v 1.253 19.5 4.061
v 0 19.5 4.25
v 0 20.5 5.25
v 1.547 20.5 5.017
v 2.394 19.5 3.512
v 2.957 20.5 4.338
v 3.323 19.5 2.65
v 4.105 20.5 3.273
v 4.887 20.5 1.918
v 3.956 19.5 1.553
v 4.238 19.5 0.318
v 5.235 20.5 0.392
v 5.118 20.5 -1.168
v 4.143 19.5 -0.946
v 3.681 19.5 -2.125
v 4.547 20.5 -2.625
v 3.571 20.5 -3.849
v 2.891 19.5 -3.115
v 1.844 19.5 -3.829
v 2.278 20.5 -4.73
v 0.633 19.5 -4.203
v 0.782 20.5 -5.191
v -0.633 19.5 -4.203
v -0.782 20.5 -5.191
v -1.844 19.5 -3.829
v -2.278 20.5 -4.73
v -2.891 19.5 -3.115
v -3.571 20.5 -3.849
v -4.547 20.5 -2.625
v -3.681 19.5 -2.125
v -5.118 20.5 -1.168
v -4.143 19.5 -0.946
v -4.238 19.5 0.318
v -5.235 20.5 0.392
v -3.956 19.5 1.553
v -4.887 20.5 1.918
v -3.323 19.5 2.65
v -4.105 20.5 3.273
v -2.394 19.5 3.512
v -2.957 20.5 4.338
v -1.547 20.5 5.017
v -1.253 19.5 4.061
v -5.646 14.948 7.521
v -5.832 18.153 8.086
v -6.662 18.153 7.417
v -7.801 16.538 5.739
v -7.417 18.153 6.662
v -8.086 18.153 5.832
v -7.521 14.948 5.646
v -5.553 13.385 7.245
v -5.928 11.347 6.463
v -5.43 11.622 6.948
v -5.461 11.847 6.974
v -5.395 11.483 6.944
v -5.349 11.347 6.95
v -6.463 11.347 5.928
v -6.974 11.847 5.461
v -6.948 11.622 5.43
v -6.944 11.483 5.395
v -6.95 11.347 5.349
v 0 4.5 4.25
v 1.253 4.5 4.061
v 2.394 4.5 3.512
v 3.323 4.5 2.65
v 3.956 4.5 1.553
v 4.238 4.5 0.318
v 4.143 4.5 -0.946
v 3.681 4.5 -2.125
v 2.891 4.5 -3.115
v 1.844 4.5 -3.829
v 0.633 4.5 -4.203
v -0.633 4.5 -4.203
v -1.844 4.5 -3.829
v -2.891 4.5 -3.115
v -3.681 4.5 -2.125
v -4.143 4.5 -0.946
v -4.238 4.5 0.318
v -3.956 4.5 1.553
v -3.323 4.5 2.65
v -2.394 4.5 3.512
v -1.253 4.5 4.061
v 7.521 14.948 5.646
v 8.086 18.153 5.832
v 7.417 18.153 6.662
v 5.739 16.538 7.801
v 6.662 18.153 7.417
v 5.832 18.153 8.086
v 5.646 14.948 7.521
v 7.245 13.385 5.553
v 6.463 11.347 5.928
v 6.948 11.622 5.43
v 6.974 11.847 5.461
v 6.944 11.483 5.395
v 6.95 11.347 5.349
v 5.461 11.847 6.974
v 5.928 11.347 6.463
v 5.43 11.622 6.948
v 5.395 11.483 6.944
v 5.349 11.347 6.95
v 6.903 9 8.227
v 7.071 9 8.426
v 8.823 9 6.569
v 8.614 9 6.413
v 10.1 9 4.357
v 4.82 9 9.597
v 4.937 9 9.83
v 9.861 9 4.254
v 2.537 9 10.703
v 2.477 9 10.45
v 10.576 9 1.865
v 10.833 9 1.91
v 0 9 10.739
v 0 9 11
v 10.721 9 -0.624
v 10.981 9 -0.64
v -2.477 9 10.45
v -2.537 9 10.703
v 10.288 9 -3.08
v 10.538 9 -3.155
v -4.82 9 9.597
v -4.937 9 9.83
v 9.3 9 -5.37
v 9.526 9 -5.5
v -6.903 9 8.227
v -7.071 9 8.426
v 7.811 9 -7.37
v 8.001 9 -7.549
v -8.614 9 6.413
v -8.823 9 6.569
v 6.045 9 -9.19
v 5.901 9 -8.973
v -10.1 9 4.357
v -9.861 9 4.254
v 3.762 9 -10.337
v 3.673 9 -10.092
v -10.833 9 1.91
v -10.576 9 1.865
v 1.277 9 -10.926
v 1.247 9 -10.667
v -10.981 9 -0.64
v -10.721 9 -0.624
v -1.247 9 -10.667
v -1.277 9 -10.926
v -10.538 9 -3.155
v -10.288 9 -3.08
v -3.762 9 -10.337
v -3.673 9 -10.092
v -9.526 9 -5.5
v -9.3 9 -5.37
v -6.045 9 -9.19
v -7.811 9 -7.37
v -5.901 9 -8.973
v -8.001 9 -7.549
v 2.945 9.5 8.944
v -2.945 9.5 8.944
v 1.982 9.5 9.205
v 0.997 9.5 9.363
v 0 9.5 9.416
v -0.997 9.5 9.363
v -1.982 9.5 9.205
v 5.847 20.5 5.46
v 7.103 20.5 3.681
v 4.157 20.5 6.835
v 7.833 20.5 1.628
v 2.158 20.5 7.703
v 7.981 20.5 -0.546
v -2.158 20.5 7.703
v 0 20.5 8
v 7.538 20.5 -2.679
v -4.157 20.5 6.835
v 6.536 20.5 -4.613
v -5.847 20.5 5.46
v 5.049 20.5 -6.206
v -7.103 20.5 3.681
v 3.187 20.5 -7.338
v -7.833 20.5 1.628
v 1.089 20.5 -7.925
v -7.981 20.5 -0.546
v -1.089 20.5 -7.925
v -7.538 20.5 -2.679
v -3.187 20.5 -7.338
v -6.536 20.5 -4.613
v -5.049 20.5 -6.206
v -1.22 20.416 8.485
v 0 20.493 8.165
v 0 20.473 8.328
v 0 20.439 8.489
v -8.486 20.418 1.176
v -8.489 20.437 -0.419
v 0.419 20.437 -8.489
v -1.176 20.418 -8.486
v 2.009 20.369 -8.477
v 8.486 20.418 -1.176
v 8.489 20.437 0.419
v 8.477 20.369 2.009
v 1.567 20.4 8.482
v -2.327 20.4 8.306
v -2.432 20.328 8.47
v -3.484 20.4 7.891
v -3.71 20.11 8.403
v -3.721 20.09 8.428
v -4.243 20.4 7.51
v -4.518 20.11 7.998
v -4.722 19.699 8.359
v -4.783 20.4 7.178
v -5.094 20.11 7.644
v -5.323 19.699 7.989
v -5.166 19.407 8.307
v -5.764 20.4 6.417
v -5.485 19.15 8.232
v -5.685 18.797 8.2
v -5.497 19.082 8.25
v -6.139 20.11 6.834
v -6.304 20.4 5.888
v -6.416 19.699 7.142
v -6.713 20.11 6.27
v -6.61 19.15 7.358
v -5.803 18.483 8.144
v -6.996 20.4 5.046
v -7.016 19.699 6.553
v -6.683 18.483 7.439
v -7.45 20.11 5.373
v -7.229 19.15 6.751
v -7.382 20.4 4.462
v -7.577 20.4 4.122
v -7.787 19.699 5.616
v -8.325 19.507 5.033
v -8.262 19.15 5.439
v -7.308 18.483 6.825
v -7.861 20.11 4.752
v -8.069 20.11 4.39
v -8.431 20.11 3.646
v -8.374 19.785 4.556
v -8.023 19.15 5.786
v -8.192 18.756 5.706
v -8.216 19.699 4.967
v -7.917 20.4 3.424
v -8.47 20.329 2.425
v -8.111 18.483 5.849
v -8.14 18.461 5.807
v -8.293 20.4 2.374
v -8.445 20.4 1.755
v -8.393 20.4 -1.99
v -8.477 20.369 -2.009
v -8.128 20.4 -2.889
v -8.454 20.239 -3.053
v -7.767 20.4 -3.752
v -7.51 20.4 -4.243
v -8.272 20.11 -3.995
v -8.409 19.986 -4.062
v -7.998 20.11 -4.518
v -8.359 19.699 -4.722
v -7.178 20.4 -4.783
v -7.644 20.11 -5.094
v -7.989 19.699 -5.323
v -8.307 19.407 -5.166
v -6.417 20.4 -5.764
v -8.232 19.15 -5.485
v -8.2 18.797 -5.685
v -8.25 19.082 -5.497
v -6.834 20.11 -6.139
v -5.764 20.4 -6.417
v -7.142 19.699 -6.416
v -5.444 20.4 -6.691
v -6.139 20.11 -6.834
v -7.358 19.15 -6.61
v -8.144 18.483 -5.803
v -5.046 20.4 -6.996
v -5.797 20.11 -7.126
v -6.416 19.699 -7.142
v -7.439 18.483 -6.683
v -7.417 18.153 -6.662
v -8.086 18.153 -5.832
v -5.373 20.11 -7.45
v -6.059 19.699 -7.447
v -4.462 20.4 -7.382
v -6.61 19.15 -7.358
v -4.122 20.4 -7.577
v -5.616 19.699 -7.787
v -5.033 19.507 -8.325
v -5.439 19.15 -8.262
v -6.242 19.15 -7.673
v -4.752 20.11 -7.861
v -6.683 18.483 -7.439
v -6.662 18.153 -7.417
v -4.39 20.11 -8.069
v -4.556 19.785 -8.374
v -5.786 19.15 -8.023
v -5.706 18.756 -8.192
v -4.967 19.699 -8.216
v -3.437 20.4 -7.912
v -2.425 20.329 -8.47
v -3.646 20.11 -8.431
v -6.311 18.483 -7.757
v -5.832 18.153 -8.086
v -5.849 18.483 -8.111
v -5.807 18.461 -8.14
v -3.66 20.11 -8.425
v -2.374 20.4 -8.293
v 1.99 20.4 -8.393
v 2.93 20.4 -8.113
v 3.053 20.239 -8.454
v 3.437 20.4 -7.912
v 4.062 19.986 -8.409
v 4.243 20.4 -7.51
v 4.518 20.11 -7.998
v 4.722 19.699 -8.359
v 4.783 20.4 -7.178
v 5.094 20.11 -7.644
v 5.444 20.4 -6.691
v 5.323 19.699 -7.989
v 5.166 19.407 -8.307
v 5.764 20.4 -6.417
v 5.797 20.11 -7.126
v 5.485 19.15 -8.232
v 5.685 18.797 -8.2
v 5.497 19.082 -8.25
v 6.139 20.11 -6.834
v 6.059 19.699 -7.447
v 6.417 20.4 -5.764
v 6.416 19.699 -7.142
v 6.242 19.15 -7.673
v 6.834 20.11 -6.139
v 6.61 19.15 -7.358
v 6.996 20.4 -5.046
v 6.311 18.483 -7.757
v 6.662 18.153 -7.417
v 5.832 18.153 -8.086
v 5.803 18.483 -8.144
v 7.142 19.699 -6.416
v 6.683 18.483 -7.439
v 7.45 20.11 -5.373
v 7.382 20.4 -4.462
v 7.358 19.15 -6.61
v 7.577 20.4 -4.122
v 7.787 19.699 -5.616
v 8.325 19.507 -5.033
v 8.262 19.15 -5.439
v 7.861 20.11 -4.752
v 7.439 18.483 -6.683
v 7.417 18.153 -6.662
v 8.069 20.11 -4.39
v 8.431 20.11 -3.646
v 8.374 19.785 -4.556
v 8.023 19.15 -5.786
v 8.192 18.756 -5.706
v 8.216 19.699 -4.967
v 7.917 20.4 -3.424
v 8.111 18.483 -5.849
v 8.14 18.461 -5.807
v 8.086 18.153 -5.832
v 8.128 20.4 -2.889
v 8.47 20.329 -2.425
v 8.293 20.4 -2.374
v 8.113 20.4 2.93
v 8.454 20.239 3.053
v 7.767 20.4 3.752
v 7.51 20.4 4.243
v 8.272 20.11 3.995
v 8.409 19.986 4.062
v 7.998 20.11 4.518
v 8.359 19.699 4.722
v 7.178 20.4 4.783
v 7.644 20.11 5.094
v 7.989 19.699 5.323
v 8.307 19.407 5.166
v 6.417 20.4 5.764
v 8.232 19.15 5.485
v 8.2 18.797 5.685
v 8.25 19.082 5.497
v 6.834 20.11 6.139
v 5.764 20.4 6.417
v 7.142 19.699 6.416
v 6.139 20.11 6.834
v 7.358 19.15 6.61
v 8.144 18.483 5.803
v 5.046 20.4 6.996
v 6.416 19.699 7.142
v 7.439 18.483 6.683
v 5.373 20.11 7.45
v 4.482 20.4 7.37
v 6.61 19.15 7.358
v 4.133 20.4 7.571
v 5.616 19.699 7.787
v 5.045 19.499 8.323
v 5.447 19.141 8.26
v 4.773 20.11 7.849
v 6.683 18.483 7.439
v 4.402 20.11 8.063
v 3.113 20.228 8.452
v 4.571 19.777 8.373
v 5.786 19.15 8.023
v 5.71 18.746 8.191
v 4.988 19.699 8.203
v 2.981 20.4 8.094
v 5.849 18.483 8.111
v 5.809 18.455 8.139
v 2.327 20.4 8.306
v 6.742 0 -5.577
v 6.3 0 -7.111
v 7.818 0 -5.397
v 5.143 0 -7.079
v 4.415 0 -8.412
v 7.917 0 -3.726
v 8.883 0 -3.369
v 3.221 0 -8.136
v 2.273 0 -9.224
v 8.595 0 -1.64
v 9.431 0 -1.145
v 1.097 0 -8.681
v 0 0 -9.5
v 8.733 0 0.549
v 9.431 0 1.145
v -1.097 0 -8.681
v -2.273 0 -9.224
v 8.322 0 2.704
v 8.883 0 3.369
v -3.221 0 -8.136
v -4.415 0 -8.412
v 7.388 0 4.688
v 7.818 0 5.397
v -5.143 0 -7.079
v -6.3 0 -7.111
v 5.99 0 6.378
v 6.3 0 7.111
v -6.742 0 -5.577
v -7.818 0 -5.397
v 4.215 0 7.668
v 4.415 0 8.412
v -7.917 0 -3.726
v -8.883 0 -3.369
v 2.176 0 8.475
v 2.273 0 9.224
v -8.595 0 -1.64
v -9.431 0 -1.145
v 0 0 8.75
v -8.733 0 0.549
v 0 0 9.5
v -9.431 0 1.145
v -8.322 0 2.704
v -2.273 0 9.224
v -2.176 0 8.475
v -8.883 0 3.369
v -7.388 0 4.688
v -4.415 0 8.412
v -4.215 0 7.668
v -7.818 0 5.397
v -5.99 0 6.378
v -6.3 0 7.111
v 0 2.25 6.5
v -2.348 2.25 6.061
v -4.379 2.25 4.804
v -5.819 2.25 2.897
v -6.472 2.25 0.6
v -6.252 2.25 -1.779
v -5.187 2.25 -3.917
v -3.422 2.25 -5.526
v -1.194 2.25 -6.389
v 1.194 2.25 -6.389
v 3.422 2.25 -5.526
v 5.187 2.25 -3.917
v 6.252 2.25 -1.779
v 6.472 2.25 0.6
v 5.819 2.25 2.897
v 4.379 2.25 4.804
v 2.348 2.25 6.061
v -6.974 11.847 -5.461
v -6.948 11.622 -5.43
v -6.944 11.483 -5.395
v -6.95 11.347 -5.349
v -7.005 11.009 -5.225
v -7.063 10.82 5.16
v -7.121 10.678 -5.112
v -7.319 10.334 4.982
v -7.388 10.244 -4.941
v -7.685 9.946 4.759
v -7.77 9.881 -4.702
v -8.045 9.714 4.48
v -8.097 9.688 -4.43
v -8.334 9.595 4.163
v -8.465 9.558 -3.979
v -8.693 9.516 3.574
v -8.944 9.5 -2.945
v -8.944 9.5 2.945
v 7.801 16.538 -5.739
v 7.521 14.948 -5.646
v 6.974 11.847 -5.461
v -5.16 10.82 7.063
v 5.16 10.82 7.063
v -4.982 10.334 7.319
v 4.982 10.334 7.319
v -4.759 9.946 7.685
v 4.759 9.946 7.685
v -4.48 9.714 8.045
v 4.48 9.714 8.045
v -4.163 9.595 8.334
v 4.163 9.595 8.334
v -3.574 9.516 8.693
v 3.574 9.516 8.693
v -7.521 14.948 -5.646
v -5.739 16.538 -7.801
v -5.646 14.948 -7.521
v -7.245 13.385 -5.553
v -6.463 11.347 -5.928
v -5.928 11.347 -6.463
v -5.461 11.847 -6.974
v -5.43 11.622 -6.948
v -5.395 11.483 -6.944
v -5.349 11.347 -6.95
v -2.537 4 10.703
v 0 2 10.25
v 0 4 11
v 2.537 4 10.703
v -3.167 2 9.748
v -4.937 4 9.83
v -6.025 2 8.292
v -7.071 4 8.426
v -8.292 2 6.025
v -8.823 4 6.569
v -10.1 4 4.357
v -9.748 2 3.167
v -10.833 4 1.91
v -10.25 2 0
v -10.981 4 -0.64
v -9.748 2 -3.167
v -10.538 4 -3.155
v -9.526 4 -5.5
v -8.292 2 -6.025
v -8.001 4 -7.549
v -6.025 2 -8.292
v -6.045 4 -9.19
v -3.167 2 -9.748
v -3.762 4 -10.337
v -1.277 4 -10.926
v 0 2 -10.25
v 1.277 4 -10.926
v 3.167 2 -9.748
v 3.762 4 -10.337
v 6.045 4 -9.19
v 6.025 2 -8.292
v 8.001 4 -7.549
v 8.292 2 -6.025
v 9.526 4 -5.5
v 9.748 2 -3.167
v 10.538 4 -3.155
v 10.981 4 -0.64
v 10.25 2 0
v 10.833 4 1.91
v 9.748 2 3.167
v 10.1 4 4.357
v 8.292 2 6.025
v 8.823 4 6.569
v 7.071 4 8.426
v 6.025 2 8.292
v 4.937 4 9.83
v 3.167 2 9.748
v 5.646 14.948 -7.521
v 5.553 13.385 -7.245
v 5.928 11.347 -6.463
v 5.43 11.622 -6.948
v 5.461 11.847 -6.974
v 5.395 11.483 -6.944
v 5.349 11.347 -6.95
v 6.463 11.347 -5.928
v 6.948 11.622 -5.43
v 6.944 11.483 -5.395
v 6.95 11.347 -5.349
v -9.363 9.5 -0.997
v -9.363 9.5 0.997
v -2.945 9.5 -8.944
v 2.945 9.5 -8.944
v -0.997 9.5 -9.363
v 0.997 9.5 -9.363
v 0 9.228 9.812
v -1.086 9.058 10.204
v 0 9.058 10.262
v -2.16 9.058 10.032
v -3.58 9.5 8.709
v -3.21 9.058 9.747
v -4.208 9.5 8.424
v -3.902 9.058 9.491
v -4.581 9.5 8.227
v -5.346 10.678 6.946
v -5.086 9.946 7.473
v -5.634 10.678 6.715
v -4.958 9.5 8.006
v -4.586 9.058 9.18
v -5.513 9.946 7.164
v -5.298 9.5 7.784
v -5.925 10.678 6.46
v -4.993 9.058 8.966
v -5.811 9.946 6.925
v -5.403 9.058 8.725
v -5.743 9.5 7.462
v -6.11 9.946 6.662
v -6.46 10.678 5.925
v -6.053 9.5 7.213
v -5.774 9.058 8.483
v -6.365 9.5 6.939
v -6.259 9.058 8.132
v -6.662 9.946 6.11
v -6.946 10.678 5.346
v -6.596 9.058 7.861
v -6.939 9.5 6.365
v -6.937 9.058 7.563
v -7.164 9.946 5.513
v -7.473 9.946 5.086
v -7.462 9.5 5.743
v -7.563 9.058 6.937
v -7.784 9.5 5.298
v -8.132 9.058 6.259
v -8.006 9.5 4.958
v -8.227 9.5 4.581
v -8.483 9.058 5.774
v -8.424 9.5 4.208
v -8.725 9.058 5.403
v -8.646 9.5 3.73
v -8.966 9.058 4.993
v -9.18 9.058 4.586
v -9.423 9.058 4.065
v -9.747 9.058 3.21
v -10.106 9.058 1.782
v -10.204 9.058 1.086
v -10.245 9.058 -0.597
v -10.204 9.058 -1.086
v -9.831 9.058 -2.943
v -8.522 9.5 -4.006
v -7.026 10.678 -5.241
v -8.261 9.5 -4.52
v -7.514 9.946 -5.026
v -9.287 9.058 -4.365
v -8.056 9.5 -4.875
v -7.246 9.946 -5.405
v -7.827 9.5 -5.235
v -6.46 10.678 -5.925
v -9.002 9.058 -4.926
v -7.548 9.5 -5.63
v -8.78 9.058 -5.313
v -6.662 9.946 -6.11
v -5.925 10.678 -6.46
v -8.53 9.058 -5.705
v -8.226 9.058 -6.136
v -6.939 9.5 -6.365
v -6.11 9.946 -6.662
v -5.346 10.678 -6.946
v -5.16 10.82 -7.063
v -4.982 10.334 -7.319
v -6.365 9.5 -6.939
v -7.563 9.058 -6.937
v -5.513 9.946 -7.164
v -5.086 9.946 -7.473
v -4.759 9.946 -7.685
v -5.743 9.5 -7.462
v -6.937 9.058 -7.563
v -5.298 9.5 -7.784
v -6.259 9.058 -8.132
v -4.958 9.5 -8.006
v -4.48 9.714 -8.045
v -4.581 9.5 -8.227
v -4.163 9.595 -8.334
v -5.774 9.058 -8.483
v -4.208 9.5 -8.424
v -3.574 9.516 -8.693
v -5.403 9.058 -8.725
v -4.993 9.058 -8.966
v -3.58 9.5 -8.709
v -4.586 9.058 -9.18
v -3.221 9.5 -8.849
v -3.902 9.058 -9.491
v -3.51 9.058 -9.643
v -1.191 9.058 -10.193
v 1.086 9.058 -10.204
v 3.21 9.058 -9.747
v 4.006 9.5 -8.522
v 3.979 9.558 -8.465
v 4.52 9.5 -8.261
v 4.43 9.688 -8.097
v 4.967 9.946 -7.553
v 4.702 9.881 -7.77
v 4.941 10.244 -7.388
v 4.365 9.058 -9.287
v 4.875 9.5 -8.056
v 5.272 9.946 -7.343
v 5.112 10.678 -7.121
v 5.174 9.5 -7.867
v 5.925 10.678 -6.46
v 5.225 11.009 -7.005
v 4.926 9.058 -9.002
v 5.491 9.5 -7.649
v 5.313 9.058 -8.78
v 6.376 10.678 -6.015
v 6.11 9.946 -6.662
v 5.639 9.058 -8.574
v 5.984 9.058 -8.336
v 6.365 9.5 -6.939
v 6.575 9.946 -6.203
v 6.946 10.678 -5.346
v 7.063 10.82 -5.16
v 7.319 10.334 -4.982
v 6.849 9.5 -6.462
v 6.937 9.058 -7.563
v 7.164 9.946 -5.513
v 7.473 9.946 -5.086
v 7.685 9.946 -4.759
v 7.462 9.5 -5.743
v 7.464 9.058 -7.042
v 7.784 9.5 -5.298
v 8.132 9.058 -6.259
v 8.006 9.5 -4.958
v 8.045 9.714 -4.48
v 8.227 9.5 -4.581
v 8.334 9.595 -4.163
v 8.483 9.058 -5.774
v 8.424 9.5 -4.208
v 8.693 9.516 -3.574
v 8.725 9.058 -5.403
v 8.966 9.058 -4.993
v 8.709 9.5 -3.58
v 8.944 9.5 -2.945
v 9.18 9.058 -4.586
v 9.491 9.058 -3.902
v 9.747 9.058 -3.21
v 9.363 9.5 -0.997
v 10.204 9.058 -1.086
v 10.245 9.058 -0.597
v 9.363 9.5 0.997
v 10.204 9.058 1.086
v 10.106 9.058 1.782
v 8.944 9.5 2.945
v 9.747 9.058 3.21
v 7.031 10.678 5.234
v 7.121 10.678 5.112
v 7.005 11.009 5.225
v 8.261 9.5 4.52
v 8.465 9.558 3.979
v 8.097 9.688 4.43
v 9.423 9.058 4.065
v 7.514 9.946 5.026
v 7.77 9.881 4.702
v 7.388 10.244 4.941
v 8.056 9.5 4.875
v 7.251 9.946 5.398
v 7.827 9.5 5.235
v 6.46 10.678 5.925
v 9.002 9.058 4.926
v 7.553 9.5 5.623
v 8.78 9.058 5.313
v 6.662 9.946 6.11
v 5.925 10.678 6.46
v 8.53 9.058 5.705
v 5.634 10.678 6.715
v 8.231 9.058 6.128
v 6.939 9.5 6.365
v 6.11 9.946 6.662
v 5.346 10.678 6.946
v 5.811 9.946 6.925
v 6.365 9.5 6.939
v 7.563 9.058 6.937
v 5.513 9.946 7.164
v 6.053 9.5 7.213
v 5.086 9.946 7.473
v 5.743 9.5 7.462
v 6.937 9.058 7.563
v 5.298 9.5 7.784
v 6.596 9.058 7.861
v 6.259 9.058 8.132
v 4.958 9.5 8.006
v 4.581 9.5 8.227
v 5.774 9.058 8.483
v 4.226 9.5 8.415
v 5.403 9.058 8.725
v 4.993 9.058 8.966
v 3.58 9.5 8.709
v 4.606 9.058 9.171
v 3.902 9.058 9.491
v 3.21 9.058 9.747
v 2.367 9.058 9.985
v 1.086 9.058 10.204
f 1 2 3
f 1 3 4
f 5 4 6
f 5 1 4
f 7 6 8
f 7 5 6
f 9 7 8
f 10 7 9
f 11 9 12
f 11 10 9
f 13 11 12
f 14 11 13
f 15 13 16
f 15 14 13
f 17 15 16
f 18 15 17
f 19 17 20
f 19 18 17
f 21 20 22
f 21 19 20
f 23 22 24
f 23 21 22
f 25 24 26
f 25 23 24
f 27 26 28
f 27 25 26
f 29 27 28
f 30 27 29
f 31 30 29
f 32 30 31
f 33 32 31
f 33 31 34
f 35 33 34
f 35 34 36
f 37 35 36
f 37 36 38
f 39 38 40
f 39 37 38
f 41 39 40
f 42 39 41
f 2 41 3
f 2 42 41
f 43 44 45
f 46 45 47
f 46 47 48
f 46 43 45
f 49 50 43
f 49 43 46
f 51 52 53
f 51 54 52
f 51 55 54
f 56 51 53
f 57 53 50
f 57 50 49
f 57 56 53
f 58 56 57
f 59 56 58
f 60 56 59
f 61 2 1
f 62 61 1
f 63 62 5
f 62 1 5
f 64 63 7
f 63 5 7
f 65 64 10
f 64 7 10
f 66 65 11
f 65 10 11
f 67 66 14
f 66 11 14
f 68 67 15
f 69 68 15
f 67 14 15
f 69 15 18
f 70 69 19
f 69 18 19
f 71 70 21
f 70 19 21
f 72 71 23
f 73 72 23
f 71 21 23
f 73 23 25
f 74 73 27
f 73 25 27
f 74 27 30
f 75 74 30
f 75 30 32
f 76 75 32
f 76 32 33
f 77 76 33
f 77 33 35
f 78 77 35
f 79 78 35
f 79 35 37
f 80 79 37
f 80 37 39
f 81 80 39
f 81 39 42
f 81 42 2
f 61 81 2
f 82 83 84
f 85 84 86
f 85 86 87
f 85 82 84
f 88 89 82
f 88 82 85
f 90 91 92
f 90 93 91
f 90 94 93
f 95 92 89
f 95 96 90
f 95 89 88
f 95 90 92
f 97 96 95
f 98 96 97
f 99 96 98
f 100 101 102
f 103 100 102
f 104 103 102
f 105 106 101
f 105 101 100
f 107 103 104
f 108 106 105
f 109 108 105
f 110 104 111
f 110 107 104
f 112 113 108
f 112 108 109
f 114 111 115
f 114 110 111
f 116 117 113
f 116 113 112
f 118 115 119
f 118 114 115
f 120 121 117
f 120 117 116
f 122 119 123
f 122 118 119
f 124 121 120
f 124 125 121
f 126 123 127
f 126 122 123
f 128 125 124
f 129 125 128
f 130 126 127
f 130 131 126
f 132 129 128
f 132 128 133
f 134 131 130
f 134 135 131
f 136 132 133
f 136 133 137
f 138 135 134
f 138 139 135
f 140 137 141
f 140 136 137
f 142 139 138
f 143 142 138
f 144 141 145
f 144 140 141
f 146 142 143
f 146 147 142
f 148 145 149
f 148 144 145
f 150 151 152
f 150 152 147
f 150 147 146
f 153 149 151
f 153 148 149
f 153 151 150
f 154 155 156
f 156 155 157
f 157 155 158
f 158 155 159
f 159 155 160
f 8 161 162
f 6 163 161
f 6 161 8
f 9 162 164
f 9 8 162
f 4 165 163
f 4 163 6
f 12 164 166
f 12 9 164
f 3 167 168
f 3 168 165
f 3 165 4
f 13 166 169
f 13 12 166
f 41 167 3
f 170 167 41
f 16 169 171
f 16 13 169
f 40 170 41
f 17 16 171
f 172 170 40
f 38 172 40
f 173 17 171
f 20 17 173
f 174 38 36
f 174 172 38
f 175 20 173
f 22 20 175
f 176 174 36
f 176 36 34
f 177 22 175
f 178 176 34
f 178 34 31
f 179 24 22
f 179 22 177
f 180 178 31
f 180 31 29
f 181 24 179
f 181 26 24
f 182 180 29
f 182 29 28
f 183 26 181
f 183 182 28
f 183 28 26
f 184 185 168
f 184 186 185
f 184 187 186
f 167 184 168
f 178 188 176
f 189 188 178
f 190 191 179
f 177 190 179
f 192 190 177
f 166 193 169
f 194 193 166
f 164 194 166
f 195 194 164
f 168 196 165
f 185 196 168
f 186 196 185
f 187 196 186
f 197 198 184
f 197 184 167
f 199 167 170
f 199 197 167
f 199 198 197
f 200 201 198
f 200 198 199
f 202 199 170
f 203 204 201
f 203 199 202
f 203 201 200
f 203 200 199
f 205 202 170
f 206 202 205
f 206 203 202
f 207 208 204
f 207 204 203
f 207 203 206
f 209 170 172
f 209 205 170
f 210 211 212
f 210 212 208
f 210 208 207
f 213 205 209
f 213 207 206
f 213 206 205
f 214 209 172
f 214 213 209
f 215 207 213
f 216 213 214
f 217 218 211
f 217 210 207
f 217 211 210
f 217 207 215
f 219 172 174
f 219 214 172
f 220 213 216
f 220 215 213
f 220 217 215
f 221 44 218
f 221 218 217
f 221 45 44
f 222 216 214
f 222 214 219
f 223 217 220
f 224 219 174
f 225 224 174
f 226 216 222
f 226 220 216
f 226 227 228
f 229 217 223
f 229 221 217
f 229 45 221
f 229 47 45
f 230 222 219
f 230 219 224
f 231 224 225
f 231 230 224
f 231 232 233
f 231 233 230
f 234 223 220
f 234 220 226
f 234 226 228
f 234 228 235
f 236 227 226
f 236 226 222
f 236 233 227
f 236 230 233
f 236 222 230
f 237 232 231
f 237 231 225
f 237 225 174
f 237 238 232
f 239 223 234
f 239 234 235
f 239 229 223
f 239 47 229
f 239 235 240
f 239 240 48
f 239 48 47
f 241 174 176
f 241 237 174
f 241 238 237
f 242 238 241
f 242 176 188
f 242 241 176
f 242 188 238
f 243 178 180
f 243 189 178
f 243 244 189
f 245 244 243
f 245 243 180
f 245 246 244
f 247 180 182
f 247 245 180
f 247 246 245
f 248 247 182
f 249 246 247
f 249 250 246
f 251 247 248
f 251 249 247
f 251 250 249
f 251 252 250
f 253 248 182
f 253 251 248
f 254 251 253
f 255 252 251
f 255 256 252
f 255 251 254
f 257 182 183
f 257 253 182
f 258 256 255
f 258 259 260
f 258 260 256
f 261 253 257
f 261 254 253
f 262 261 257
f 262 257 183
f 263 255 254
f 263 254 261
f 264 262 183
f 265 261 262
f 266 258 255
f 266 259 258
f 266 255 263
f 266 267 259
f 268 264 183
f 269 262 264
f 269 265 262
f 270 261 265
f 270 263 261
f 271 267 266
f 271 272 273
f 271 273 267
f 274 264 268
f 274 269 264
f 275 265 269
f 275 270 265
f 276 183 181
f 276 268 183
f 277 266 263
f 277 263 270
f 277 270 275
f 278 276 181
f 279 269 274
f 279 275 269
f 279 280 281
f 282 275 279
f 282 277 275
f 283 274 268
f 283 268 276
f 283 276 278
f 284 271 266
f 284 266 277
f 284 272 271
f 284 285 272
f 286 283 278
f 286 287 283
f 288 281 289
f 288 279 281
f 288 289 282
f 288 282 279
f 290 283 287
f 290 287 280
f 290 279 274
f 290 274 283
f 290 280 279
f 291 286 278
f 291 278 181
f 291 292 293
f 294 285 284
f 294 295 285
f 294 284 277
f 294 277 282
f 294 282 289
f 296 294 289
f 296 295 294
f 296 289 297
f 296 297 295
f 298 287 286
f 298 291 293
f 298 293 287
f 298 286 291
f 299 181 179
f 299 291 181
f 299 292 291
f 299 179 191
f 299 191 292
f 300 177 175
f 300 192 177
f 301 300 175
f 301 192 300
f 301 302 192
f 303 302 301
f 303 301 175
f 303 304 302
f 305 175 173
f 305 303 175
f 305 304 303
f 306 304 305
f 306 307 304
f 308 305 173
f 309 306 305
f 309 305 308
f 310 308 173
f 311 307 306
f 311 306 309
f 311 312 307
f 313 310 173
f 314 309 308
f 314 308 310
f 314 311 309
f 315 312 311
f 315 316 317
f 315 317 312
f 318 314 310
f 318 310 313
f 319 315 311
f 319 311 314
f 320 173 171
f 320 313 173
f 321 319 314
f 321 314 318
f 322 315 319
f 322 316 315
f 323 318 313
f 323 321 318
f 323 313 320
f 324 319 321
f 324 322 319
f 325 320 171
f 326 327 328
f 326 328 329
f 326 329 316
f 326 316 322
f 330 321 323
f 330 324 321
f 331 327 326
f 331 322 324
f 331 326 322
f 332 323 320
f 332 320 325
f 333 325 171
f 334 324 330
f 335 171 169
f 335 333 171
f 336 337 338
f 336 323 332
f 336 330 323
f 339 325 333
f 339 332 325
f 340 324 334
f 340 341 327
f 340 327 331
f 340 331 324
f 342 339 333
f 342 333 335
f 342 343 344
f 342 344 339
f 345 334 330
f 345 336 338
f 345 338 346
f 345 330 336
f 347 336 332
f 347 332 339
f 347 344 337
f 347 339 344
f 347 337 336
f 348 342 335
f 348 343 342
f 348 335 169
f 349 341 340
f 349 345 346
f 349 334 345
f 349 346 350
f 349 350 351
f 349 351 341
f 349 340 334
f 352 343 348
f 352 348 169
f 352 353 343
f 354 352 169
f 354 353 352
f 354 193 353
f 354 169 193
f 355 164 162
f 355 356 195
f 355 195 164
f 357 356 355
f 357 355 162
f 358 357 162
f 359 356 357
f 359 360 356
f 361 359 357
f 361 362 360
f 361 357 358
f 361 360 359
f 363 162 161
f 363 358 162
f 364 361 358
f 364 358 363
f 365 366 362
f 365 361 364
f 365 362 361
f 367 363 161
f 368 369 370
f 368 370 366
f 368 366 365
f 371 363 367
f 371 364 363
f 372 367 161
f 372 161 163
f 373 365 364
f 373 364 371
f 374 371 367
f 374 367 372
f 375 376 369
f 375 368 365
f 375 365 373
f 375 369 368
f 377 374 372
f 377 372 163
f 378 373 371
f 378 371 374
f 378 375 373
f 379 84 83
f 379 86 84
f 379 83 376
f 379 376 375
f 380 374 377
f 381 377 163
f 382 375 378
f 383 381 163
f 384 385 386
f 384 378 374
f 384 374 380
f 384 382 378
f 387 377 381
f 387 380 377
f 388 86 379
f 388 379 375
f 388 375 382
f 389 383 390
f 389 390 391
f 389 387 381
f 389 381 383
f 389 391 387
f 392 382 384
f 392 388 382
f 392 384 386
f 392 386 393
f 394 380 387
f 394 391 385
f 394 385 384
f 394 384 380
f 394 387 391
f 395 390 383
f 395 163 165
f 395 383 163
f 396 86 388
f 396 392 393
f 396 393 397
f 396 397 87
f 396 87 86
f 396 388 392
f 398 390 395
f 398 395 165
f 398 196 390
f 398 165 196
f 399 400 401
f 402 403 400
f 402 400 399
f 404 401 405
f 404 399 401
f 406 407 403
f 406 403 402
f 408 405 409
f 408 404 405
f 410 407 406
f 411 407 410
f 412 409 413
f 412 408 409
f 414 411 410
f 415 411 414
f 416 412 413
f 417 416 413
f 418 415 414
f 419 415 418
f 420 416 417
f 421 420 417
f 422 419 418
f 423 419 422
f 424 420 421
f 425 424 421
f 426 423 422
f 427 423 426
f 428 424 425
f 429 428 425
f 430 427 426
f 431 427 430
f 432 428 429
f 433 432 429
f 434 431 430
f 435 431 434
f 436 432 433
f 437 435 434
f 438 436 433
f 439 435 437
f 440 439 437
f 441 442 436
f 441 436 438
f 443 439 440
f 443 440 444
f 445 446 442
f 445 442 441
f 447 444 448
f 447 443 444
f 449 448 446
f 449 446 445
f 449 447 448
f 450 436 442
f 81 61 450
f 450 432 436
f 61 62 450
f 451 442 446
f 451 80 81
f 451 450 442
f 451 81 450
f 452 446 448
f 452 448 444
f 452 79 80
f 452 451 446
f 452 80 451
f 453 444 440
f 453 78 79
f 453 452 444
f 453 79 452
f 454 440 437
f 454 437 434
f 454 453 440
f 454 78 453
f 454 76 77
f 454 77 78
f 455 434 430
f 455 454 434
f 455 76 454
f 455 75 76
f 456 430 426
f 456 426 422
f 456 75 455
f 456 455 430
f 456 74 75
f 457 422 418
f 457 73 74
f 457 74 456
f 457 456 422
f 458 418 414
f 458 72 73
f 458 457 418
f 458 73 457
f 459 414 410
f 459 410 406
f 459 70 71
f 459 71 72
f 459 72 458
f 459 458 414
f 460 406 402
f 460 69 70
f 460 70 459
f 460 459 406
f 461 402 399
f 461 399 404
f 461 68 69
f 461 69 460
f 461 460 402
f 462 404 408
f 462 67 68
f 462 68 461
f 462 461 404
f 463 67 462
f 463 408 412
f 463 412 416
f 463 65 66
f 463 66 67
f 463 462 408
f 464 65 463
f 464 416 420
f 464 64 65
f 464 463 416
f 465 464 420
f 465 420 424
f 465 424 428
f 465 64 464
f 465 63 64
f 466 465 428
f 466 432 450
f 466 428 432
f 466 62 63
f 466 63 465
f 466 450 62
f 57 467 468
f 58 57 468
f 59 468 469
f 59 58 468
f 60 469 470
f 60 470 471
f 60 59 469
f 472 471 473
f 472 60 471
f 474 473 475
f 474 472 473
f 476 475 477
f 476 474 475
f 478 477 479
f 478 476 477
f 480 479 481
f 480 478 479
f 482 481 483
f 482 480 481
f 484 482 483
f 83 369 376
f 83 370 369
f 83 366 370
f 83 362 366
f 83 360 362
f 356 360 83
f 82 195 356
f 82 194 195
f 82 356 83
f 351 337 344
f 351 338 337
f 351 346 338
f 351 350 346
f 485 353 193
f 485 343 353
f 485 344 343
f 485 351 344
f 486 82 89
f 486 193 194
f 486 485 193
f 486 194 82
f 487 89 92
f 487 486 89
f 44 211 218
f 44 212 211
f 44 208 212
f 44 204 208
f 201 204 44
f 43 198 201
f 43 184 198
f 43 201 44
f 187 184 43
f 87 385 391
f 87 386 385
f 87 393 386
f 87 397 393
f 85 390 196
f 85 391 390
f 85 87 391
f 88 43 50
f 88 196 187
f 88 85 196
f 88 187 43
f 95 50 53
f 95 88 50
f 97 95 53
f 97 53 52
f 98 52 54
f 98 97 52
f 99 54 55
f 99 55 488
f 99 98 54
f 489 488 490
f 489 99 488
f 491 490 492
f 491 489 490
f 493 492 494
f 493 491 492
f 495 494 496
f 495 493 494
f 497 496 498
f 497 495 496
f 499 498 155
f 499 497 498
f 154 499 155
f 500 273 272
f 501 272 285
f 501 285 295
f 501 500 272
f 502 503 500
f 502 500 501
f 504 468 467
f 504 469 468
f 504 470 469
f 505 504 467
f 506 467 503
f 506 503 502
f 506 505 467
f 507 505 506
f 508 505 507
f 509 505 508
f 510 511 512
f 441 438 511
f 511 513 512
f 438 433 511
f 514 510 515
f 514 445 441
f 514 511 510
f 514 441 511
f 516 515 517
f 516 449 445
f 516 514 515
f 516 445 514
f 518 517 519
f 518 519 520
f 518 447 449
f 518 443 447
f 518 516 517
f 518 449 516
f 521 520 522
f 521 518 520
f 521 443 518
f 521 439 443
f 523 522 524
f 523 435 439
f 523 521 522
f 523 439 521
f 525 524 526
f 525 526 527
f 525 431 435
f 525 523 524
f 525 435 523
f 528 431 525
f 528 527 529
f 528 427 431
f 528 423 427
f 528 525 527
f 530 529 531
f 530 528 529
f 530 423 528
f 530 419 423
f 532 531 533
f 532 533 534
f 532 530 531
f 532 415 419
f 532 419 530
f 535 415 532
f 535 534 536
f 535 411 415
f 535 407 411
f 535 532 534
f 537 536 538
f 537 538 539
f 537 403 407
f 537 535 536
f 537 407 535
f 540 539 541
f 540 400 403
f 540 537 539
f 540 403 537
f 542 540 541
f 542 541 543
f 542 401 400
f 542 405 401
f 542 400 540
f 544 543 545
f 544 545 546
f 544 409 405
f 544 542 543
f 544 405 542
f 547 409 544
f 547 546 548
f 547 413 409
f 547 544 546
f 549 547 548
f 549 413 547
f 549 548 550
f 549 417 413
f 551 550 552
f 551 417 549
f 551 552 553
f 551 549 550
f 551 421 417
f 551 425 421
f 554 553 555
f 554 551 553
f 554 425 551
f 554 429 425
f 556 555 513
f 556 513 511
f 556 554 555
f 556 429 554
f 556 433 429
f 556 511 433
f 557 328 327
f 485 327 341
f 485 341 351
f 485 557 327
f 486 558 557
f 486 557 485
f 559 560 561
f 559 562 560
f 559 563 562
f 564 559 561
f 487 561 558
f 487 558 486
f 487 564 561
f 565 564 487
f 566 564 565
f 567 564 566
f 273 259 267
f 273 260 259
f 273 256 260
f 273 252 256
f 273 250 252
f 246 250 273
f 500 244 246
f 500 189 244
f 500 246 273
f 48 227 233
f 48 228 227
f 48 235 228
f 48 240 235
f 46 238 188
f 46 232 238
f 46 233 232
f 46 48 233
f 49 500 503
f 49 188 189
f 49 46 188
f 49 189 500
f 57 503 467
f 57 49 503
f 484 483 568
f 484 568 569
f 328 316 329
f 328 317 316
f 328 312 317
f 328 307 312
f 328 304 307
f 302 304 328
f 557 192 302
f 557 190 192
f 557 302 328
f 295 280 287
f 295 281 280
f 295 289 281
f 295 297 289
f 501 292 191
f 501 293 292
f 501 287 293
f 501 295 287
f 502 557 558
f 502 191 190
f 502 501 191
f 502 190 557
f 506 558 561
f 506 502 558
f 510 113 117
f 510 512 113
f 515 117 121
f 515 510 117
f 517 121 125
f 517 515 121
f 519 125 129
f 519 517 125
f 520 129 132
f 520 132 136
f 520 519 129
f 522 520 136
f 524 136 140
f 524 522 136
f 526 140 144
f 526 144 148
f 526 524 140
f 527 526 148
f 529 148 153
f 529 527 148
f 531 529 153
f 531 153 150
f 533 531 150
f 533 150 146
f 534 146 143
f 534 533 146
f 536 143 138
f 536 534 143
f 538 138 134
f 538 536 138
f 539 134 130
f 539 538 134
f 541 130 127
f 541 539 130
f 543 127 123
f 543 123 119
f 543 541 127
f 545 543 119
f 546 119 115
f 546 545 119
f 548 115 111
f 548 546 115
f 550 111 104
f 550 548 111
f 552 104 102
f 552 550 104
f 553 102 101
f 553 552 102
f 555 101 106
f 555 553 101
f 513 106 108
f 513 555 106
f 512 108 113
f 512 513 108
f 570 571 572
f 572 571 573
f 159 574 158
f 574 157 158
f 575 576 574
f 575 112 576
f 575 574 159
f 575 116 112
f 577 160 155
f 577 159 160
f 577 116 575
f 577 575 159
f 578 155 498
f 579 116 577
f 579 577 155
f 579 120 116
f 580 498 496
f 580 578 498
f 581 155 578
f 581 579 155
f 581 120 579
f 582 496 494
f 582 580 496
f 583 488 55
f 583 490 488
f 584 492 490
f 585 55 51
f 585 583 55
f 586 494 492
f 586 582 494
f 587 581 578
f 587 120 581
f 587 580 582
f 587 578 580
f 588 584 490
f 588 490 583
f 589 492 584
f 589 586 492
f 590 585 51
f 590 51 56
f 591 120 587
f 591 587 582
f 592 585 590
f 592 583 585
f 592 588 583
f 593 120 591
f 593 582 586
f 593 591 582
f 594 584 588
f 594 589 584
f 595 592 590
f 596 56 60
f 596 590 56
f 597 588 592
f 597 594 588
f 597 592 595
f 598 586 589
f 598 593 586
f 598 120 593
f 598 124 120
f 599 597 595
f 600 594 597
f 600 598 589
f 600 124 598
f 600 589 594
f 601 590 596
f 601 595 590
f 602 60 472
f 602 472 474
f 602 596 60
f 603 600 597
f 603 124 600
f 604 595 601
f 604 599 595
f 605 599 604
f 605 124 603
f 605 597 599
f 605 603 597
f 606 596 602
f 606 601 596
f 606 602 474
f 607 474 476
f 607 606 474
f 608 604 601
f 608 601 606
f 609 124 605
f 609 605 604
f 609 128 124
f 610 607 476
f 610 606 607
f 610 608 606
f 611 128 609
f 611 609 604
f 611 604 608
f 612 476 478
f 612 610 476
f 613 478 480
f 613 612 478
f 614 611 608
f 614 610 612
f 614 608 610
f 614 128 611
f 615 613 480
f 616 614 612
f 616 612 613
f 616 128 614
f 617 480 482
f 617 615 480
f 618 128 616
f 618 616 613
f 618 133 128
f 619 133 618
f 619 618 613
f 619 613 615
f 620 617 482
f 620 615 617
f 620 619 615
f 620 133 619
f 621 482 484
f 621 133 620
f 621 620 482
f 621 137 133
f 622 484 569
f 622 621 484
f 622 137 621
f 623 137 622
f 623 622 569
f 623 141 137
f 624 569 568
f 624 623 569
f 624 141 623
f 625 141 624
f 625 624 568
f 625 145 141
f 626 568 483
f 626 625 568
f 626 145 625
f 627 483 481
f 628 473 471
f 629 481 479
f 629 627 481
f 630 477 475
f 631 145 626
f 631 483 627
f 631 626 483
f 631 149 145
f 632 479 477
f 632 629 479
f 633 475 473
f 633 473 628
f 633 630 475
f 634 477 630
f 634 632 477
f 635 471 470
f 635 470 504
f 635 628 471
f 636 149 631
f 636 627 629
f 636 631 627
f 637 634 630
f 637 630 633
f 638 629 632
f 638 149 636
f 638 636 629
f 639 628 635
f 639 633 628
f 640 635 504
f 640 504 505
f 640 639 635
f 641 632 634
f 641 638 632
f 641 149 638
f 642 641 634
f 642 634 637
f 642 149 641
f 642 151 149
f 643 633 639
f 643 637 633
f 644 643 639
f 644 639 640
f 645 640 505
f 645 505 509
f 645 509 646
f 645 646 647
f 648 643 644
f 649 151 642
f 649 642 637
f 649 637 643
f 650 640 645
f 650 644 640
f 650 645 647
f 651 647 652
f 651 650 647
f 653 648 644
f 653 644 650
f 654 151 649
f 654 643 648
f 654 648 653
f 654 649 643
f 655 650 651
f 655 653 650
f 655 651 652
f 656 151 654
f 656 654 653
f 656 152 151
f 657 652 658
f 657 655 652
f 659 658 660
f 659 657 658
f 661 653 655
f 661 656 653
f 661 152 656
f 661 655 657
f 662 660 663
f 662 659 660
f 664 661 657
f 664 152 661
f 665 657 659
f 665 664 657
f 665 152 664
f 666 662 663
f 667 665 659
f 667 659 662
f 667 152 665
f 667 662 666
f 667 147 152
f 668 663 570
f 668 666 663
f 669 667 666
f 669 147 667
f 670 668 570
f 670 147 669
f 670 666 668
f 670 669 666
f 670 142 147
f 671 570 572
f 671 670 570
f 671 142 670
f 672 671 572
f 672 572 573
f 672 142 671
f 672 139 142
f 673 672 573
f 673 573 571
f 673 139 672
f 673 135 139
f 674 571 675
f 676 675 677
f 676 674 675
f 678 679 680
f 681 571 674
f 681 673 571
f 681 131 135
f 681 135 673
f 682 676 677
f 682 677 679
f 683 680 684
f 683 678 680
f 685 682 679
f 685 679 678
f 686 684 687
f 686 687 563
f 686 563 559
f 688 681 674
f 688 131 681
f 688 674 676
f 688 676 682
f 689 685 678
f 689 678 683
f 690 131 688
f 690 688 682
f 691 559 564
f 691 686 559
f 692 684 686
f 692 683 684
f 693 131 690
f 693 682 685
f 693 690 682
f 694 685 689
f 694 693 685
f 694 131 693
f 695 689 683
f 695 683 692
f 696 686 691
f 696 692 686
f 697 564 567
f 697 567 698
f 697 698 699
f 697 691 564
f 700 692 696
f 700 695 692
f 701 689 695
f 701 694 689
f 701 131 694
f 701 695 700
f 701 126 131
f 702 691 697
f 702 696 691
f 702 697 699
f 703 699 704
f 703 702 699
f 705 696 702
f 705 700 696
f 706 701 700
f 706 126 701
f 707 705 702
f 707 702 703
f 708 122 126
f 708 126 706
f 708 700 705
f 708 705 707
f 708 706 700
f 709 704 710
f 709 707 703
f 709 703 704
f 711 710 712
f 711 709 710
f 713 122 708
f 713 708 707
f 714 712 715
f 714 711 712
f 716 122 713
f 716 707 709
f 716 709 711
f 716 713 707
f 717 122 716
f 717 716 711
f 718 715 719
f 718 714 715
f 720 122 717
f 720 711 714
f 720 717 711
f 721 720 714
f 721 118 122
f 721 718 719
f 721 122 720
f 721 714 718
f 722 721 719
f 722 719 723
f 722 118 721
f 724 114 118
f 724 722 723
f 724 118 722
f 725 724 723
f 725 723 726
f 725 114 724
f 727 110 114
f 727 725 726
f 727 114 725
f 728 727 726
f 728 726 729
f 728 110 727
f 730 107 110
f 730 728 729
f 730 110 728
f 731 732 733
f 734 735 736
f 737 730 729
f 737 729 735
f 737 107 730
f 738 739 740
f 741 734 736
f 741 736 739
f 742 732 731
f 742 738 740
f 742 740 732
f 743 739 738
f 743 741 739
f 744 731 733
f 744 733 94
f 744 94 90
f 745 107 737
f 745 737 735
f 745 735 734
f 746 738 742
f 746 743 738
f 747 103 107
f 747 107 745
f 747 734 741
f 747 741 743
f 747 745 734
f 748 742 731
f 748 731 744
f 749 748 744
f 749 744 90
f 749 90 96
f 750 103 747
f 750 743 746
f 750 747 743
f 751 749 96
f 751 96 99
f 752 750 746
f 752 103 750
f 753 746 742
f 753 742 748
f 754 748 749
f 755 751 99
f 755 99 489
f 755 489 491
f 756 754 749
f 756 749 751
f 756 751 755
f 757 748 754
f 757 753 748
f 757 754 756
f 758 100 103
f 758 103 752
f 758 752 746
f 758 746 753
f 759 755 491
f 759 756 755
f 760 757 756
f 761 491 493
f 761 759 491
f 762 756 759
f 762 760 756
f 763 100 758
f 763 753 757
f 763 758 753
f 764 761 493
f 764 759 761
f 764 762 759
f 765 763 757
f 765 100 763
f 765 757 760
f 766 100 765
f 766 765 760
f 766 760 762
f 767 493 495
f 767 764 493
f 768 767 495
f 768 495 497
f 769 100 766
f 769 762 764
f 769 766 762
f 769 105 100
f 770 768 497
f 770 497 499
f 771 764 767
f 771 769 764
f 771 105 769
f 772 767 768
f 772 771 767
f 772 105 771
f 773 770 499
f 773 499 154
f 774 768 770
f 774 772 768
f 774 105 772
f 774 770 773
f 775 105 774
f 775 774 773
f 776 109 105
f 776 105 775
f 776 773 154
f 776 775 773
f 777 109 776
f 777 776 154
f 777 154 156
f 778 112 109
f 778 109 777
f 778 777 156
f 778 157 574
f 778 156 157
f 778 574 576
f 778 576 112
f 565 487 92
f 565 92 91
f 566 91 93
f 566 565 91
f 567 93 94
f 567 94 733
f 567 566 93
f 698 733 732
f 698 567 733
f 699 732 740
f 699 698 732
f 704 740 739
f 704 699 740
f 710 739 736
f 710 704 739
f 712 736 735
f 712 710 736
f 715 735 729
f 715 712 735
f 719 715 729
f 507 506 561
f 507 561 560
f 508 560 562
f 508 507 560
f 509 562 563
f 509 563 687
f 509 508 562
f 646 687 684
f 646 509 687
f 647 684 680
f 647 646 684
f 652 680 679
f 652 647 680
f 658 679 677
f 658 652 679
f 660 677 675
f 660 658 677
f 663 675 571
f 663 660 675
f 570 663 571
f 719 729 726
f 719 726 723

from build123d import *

# Parameters (mm, degrees)
SKETCH2_R          = 4.25
CUT_EXTRUDE1_DEPTH = 26.734218465
CHAMFER1_SIZE      = 1
CUT_EXTRUDE2_DEPTH = 26.734218465
CIRPATTERN1_COUNT  = 4


with BuildPart() as part:
    # Sketch1 → Revolve1 (revolve)
    with BuildSketch(Plane.XY, mode=Mode.PRIVATE) as revolve1_sk:
        with BuildLine():
            Line((0, 20.5), (-8, 20.5))
            ThreePointArc((-8, 20.5), (-9.532088886, 19.785575219), (-9.969615506, 18.152703645))
            Line((-9.969615506, 18.152703645), (-8.769638586, 11.347296355))
            ThreePointArc((-8.769638586, 11.347296355), (-9.207165206, 9.714424781), (-10.739254092, 9))
            Line((-10.739254092, 9), (-11, 9))
            Line((-11, 9), (-11, 4))
            Line((-11, 4), (-9.5, 0))
            Line((-9.5, 0), (-8.75, 0))
            Line((-8.75, 0), (0, 8.75))
            Line((0, 8.75), (0, 20.5))
        make_face()
    revolve(revolve1_sk.sketch.rotate(Axis((0, 20.5, 0), (0, -1, 0)), 270), axis=Axis((0, 20.5, 0), (0, -1, 0)))

    # Sketch2 → Cut-Extrude1 (cut, through all)
    with BuildSketch(Plane(origin=(0, 20.5, 0), x_dir=(1, 0, 0), z_dir=(0, 1, 0))):
        with Locations(Location((0, 0, 0), (0, 0, 270))):
            Circle(SKETCH2_R)
    extrude(amount=-CUT_EXTRUDE1_DEPTH, mode=Mode.SUBTRACT)

    # Chamfer1
    chamfer1_edges = [part.edges().sort_by_distance(p)[0] for p in [
        (0, 20.5, -4.25),
    ]]
    chamfer(chamfer1_edges, length=CHAMFER1_SIZE)

    # Sketch3 → Cut-Extrude2 (cut, symmetric)
    with BuildSketch(Plane(origin=(0, 0, 0), x_dir=(0, 0, -1), z_dir=(1, 0, 0))):
        with BuildLine():
            Line((-8.5, 20.5), (-6.974294891, 11.847296355))
            ThreePointArc((-6.974294891, 11.847296355), (-7.411821511, 10.214424781), (-8.943910397, 9.5))
            Line((-8.943910397, 9.5), (-13.5, 9.5))
            Line((-13.5, 9.5), (-13.5, 20.5))
            Line((-13.5, 20.5), (-8.5, 20.5))
        make_face()
    cut_extrude2 = extrude(amount=CUT_EXTRUDE2_DEPTH, both=True, mode=Mode.SUBTRACT)

    # CirPattern1: Cut-Extrude2 ×4 about axis
    cirpattern1_axis = Axis((0, 0, 0), (0, 1, 0))
    for i in range(1, CIRPATTERN1_COUNT):
        add(cut_extrude2.rotate(cirpattern1_axis, i * 360 / CIRPATTERN1_COUNT), mode=Mode.SUBTRACT)


solid = part.part
